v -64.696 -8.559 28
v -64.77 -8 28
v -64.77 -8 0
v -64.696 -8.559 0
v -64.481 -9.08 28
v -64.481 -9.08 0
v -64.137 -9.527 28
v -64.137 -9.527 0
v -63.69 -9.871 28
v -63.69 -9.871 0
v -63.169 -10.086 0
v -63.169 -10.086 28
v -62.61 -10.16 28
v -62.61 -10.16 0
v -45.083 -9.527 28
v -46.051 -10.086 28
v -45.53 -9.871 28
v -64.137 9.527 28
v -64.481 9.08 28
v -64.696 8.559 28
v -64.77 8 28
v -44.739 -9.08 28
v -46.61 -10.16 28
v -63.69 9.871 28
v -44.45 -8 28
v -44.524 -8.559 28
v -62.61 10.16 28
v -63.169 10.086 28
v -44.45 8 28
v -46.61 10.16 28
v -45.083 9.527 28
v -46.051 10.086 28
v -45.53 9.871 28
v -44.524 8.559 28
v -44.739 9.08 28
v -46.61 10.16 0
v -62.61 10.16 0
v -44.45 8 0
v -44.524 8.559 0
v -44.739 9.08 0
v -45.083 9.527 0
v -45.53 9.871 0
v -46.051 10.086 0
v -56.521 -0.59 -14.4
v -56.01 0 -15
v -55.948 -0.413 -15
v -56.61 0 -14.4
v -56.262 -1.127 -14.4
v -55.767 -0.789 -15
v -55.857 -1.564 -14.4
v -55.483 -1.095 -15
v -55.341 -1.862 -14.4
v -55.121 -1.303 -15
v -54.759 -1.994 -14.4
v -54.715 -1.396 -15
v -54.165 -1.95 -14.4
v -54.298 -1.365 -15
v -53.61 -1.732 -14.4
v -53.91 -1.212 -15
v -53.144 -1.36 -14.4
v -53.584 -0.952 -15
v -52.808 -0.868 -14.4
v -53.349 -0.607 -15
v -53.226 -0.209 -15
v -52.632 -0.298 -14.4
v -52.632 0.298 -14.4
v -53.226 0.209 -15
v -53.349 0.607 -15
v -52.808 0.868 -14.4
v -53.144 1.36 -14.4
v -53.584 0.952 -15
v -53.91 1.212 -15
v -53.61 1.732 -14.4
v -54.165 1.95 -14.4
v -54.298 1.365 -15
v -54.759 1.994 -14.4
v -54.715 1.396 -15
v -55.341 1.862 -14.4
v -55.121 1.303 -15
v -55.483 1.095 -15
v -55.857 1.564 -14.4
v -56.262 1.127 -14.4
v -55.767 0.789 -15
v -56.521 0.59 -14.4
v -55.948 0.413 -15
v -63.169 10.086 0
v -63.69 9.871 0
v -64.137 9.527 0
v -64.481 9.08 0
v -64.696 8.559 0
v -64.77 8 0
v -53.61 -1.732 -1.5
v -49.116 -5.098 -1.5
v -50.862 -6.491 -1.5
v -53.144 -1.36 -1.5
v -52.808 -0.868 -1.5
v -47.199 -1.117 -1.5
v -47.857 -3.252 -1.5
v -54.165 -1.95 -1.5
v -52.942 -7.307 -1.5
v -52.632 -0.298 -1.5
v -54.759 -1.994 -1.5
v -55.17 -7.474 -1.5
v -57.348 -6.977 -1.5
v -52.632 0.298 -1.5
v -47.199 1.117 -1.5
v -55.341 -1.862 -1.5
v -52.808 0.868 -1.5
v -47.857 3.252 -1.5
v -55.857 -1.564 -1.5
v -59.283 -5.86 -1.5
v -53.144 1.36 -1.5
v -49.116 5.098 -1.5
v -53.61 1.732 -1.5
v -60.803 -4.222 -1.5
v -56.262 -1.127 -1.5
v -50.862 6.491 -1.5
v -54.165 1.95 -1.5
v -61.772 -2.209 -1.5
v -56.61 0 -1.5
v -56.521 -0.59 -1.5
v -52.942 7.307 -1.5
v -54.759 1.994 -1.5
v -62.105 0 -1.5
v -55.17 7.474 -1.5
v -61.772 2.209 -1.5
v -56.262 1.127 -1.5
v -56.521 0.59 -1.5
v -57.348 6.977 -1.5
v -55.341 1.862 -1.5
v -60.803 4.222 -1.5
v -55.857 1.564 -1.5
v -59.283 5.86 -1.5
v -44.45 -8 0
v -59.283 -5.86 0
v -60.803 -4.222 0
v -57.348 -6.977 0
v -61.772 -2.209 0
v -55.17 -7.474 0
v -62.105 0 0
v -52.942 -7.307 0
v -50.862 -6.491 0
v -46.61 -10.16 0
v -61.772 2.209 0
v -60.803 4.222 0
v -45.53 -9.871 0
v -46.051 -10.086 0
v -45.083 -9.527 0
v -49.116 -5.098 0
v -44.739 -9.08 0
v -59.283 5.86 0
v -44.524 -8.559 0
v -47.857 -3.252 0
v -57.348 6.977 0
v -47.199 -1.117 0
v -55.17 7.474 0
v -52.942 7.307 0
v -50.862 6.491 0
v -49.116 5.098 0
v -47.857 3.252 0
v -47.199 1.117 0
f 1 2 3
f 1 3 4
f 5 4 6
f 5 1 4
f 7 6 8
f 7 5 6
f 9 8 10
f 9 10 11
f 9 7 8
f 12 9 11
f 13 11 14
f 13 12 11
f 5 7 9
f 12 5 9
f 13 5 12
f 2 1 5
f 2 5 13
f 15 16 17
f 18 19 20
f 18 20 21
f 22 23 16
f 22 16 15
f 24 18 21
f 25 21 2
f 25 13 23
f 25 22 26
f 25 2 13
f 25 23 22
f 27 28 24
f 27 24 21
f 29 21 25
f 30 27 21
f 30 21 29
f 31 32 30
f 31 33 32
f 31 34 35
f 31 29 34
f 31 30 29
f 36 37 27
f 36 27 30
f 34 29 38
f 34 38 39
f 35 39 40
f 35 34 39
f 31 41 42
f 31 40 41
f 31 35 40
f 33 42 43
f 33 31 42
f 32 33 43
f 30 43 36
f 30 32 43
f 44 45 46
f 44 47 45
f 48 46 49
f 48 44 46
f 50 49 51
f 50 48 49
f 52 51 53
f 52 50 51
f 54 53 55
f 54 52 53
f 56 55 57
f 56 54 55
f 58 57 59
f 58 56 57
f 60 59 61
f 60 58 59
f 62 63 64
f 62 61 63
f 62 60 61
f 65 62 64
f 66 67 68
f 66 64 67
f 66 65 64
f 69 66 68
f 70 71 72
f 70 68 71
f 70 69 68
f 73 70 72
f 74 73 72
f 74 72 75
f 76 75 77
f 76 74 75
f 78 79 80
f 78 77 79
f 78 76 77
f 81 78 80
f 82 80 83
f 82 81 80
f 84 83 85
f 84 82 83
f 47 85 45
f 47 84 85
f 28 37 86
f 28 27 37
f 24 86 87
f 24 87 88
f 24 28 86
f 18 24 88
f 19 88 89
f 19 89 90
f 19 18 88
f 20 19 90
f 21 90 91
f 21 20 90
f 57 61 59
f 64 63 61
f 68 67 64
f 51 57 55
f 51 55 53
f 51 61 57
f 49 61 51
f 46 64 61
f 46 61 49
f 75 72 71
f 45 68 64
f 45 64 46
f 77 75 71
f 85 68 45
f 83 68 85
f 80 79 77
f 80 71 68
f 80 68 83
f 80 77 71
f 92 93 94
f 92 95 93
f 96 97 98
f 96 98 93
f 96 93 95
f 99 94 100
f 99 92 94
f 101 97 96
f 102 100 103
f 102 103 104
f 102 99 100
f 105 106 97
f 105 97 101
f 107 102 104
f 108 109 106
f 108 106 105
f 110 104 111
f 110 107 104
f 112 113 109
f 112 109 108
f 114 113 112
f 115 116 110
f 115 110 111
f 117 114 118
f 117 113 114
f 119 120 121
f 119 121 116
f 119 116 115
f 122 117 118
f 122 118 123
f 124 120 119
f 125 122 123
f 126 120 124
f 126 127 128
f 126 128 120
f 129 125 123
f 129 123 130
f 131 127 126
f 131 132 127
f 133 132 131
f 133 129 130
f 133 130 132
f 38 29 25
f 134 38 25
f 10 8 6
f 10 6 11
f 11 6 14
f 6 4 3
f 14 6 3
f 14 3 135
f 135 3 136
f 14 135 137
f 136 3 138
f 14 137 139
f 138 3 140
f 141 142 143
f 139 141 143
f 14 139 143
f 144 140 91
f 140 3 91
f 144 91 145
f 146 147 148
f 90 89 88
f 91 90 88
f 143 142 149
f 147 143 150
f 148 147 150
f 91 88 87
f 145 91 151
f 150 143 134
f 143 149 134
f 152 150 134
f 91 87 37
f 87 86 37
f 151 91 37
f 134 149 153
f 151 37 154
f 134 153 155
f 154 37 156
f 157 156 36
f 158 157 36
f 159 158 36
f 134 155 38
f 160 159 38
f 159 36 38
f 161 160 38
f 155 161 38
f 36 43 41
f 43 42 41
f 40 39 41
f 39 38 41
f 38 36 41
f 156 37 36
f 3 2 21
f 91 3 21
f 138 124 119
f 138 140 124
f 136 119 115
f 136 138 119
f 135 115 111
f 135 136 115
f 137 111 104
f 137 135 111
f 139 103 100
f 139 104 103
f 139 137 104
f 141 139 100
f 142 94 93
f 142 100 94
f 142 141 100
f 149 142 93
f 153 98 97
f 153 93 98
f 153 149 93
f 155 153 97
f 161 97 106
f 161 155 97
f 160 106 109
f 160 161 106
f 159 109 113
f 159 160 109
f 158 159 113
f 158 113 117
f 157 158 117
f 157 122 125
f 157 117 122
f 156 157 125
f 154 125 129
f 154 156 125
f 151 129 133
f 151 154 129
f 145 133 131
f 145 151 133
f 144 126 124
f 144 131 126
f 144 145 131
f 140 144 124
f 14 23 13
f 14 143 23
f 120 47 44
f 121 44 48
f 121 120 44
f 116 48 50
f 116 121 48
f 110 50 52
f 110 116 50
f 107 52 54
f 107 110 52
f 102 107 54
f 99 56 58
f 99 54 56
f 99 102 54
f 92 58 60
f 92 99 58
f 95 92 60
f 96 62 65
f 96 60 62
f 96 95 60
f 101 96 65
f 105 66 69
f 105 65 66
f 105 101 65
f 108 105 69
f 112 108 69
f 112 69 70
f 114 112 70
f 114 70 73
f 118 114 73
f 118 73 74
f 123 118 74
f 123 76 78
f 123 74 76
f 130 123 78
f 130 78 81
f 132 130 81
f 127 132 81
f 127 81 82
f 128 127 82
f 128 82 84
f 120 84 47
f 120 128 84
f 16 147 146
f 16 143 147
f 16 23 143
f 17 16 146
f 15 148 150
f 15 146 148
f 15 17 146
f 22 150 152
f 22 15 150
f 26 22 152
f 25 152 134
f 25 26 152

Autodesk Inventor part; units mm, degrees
ref_plane "YZ Plane" through (0, 0, 0) normal (1, 0, 0) x (0, 1, 0)
ref_plane "XZ Plane" through (0, 0, 0) normal (0, 1, 0) x (-1, 0, 0)
ref_plane "XY Plane" through (0, 0, 0) normal (0, 0, 1) x (1, 0, 0)
sketch "Sketch1" plane through (0, 0, 0) normal (0, 0, 1) x (1, 0, 0)
  circle A0 centre (-54.61, 0) radius 11.5 construction
  circle A1 centre (-66.11, 11.5) radius 1.3 construction
  circle A2 centre (-43.11, 11.5) radius 1.3 construction
  circle A3 centre (-66.11, -11.5) radius 1.3 construction
  circle A4 centre (-43.11, -11.5) radius 1.3 construction
  line L0 (-64.77, 10.16) -> (-44.45, 10.16)
  line L1 (-44.45, 10.16) -> (-44.45, -10.16)
  line L2 (-44.45, -10.16) -> (-64.77, -10.16)
  line L3 (-64.77, -10.16) -> (-64.77, 10.16)
  line L4 (-64.77, 10.16) -> (-44.45, -10.16) construction
  line L5 (-44.45, 10.16) -> (-64.77, -10.16) construction
  circle A5 centre (-54.61, 0) radius 7.495
  point P0 (0, 0)
  dimension "d0" = 20.32
  dimension "d1" = 20.32
  dimension "d2" = 14.99
extrude "Extrusion1" add sketch "Sketch1" along normal blind 28 contours L0 L1 L2 L3 | A5
sketch "Sketch2" plane through (0, 0, 0) normal (0, 0, -1) x (-1, 0, 0)
  point P0 (0, 0)
  point P1 (66.11, -11.5)
  point P2 (43.11, -11.5)
  point P3 (43.11, 11.5)
  point P4 (66.11, 11.5)
hole "Hole1" at (-66.11, -11.5, 0) at (-43.11, -11.5, 0) at (-43.11, 11.5, 0) at (-66.11, 11.5, 0) direction (0, 0, 1) diameter 3 depth 8 tip angle 118
sketch "Sketch3" plane through (0, 0, 0) normal (0, 0, -1) x (-1, 0, 0)
  circle A0 centre (54.61, 0) radius 7.495 projected
  circle A1 centre (54.61, 0) radius 2
  point P0 (0, 0)
  dimension "d14" = 4
extrude "Extrusion2" add sketch "Sketch3" along normal blind 1.5 contours A0 | A1
extrude "Extrusion3" add sketch "Sketch3" along normal blind 15 contours A1
chamfer "Chamfer1" distance 0.6 angle 45 1 edges at (-52.61, 0, -15)
fillet "Fillet1" radius 2.16 4 edges at (-64.77, -10.16, 14) (-64.77, 10.16, 14) (-44.45, -10.16, 14) (-44.45, 10.16, 14)
properties part number "Nema 8"
